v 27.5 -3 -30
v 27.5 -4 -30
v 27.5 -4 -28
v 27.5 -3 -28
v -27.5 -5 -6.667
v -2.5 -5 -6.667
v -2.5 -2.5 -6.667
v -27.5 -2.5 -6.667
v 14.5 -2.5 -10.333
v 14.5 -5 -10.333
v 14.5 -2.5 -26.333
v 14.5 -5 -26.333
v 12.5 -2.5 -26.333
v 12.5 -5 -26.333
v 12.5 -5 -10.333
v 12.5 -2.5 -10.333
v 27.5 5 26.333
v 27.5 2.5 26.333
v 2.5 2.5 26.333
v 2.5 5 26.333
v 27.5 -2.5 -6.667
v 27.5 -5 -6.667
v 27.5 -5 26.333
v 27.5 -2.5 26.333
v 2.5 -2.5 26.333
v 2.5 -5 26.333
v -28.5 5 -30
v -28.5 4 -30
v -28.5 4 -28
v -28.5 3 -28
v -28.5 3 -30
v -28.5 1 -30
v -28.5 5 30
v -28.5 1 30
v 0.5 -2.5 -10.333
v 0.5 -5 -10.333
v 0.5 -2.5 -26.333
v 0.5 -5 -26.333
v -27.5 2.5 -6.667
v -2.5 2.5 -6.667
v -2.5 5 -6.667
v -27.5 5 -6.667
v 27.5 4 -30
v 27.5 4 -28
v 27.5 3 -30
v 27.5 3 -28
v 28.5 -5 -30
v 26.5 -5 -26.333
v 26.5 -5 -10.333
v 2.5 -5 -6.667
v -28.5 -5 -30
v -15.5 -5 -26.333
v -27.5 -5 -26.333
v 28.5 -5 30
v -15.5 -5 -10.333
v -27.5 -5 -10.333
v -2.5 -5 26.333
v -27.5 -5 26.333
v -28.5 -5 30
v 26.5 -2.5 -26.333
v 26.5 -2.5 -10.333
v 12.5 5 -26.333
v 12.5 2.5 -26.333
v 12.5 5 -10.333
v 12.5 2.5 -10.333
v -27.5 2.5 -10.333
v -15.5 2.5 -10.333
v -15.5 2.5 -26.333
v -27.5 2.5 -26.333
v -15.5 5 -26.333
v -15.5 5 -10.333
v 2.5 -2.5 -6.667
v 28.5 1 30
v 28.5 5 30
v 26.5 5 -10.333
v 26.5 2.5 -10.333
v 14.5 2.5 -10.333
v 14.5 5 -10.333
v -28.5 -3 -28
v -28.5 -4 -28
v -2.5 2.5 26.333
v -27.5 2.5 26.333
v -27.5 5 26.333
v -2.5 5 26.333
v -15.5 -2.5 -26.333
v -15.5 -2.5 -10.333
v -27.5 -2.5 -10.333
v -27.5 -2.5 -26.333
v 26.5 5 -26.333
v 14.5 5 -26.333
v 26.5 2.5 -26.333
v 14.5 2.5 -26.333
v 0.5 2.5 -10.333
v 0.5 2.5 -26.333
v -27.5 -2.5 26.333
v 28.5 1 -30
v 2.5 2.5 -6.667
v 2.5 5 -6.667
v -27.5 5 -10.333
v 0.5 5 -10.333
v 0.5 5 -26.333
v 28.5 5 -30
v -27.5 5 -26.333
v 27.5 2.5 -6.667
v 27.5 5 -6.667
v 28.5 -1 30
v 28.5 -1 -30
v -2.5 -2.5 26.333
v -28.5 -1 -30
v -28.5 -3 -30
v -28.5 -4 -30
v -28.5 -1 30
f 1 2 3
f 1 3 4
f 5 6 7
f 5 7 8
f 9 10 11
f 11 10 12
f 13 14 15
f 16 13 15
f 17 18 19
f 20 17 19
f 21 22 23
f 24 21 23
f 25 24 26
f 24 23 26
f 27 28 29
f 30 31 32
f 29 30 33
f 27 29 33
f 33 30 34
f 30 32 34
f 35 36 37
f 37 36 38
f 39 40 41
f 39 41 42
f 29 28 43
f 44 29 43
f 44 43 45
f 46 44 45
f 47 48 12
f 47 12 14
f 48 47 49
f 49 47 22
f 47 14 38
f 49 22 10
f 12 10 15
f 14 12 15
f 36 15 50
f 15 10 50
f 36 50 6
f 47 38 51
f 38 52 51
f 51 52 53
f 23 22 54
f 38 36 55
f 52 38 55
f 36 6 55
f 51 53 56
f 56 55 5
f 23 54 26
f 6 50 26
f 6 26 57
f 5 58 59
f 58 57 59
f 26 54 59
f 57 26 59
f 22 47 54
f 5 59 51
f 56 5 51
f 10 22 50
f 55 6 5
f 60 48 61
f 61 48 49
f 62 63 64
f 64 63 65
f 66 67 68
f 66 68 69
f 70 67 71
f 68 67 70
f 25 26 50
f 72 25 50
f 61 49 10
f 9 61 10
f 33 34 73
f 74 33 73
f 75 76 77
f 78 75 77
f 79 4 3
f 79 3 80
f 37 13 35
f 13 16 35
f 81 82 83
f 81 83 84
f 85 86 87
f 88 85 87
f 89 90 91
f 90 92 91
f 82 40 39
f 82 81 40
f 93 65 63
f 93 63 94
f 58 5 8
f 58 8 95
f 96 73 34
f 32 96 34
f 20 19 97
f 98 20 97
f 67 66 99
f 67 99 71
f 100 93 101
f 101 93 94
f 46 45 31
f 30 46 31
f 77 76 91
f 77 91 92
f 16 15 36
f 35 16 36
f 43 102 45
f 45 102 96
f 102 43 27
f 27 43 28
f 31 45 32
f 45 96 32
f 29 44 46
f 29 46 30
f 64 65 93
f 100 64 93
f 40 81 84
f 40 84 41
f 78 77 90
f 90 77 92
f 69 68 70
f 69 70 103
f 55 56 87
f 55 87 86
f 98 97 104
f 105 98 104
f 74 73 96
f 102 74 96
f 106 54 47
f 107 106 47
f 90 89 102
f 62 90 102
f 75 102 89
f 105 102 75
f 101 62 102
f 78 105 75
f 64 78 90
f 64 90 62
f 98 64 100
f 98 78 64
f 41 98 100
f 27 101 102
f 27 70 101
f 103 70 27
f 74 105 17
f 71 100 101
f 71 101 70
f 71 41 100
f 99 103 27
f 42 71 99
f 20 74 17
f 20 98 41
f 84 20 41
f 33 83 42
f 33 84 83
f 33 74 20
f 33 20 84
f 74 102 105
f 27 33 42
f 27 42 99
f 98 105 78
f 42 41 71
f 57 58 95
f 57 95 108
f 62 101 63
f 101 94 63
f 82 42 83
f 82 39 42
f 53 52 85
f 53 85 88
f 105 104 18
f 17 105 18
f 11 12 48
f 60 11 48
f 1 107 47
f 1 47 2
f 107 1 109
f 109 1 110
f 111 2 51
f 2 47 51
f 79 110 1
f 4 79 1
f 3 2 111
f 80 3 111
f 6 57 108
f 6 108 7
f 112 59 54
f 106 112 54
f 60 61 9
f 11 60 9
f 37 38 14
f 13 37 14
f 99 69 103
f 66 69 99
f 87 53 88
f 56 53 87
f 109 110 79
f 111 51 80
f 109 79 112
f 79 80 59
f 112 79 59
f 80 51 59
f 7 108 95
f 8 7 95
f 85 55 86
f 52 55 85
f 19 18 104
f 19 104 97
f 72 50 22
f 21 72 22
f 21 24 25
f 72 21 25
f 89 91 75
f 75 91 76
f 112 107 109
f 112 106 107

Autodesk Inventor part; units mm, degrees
ref_plane "YZ Plane" through (0, 0, 0) normal (1, 0, 0) x (0, 1, 0)
ref_plane "XZ Plane" through (0, 0, 0) normal (0, 1, 0) x (-1, 0, 0)
ref_plane "XY Plane" through (0, 0, 0) normal (0, 0, 1) x (1, 0, 0)
sketch "Schizzo1" plane through (0, 0, 0) normal (0, 1, 0) x (-1, 0, 0)
  line L0 (28.5, 30) -> (-28.5, 30)
  line L1 (-28.5, 30) -> (-28.5, -30)
  line L2 (-28.5, -30) -> (28.5, -30)
  line L3 (28.5, -30) -> (28.5, 30)
  line L4 (0, 0) -> (0, -115.6454) construction
  line L5 (0, 0) -> (39.5796, 0) construction
  line L6 (27.5, 26.3333) -> (2.5, 26.3333)
  line L7 (2.5, 26.3333) -> (2.5, -6.6667)
  line L8 (2.5, -6.6667) -> (27.5, -6.6667)
  line L9 (27.5, -6.6667) -> (27.5, 26.3333)
  line L10 (28.5, 30) -> (28.5, 26.3333) construction
  line L11 (28.5, 26.3333) -> (27.5, 26.3333) construction
  line L12 (15.5, -10.3333) -> (15.5, -26.3333)
  line L13 (15.5, -26.3333) -> (27.5, -26.3333)
  line L14 (27.5, -26.3333) -> (27.5, -10.3333)
  line L15 (27.5, -10.3333) -> (15.5, -10.3333)
  line L16 (27.5, -6.6667) -> (27.5, -10.3333) construction
  line L17 (27.5, -10.3333) -> (28.5, -10.3333) construction
  line L18 (1.5, -10.3333) -> (1.5, -26.3333)
  line L19 (1.5, -26.3333) -> (13.5, -26.3333)
  line L20 (13.5, -10.3333) -> (1.5, -10.3333)
  line L21 (15.5, -10.3333) -> (13.5, -10.3333) construction
  line L22 (-2.5, -6.6667) -> (-27.5, -6.6667)
  line L23 (-27.5, -6.6667) -> (-27.5, 26.3333)
  line L24 (-27.5, 26.3333) -> (-2.5, 26.3333)
  line L25 (-2.5, 26.3333) -> (-2.5, -6.6667)
  line L26 (-14.5, -10.3333) -> (-14.5, -26.3333)
  line L27 (-14.5, -26.3333) -> (-26.5, -26.3333)
  line L28 (-26.5, -26.3333) -> (-26.5, -10.3333)
  line L29 (-26.5, -10.3333) -> (-14.5, -10.3333)
  line L30 (-0.5, -10.3333) -> (-0.5, -26.3333)
  line L31 (-12.5, -26.3333) -> (-12.5, -10.3333)
  line L32 (-12.5, -10.3333) -> (-0.5, -10.3333)
  line L33 (-0.5, -26.3333) -> (-12.5, -26.3333)
  line L34 (4.1, -0.1) -> (3.9, -0.1) construction
  line L35 (1.5, -10.3333) -> (-0.5, -10.3333) construction
  line L36 (-12.5, -10.3333) -> (-14.5, -10.3333) construction
  line L37 (2.5, 26.3333) -> (-2.5, 26.3333) construction
  line L38 (27.5, 30) -> (27.5, 0)
  line L39 (27.5, 0) -> (2.5, 0)
  line L40 (2.5, 0) -> (2.5, 30)
  line L41 (-27.5, 0) -> (-2.5, 0)
  line L42 (-2.5, 30) -> (-2.5, 0)
  line L43 (-2.5, 0) -> (-27.5, 0)
  line L44 (-27.5, 0) -> (-27.5, 30)
  line L45 (28, 30) -> (28, 26.3333) construction
  line L46 (27.5, -30) -> (27.5, -14)
  line L47 (27.5, -14) -> (15.5, -14)
  line L48 (15.5, -14) -> (15.5, -30)
  line L49 (27.5, -30) -> (27.5, -26.3333) construction
  line L50 (27.5, -26.3333) -> (28.5, -26.3333) construction
  line L51 (28, -26.3333) -> (28, -30) construction
  line L52 (15.5, -26.3333) -> (13.5, -26.3333) construction
  line L53 (-27.5, 26.3333) -> (-28.5, 26.3333) construction
  line L54 (13.5, -26.3333) -> (13.5, -10.3333)
  line L55 (1.5, -14) -> (1.5, -30)
  line L56 (13.5, -14) -> (1.5, -14)
  line L57 (13.5, -30) -> (13.5, -14)
  line L58 (-12.5, -14) -> (-12.5, -30)
  line L59 (-0.5, -14) -> (-12.5, -14)
  line L60 (-0.5, -30) -> (-0.5, -14)
  line L61 (-26.5, -14) -> (-26.5, -30)
  line L62 (-14.5, -14) -> (-26.5, -14)
  line L63 (-14.5, -30) -> (-14.5, -14)
  point P0 (0.4384, -30)
  point P1 (-4.1232, -30)
  dimension "d2" = 25
  dimension "d3" = 33
  dimension "d6" = 12
  dimension "d26" = 60
  dimension "d46" = 30
  dimension "d47" = 16
  dimension "d52" = 11.0796
  dimension "d61" = 57
  dimension "d62" = 2
  dimension "d63" = 16
  dimension "d66" = 14
  dimension "d71" = 5
extrude "Estrusione1" add sketch "Schizzo1" along normal mid plane 10 contours L3 L2 L46 L14 L15 L12 L48 L57 L54 L20 L18 L55 L60 L30 L32 L31 L58 L63 L26 L29 L28 L61 L1 L0 L44 L23 L22 L25 L42 L40 L7 L8 L9 L38 | L38 L6 L40 L0 | L2 L48 L13 L46 | L42 L24 L44 L0 | L2 L55 L19 L57 | L19 L18 L56 L54 | L2 L58 L33 L60 | L56 L18 L20 L54 | L61 L27 L63 L2
extrude "Estrusione2" add sketch "Schizzo1" along normal mid plane 5 contours L9 L39 L7 L6 | L9 L8 L7 L39 | L13 L12 L47 L14 | L25 L41 L23 L24 | L47 L12 L15 L14 | L25 L22 L23 L41 | L33 L31 L59 L30 | L28 L62 L26 L27 | L59 L31 L32 L30 | L28 L29 L26 L62
sketch "Schizzo3" plane through (-28.5, 5, 30) normal (0, 0, 1) x (1, 0, 0)
  line L0 (0, -10) -> (0, 0) construction
  line L1 (0, -5) -> (28.5, -5) construction
  line L2 (1, -10) -> (26, -10) projected
  line L3 (1, 0) -> (1, -2.5) projected
  line L4 (89, -2.5) -> (89, 0) projected
  line L5 (0, -5) -> (0, -9) construction
  line L6 (0, -5) -> (0, -8) construction
  line L7 (0, -8) -> (57, -8)
  line L8 (57, -10) -> (57, 0) projected
  line L9 (0, -9) -> (57, -9)
  line L10 (89, -9) -> (89, -8)
  line L11 (1, -9) -> (1, -8)
  line L12 (0, -2) -> (57, -2)
  line L13 (0, -1) -> (57, -1)
  line L14 (89, -1) -> (89, -2)
  line L15 (1, -1) -> (1, -2)
  point P0 (1, -7.5)
  dimension "d40" = 4
  dimension "d41" = 3
extrude "Estrusione5" [suppressed]
sketch "Schizzo4" plane through (28.5, 5, -30) normal (0, 0, -1) x (-1, 0, 0)
  line L0 (89, -2) -> (89, -1) projected
  line L1 (89, -2) -> (89, -1)
  line L2 (89, -1) -> (1, -1) projected
  line L3 (89, -1) -> (1, -1)
  line L4 (1, -1) -> (1, -2) projected
  line L5 (1, -1) -> (1, -2)
  line L6 (1, -2) -> (89, -2) projected
  line L7 (1, -2) -> (89, -2)
  line L8 (89, -8) -> (1, -8) projected
  line L9 (1, -9) -> (89, -9) projected
  line L10 (89, -8) -> (89, -9)
  line L11 (89, -9) -> (1, -9)
  line L12 (1, -9) -> (1, -8)
  line L13 (1, -8) -> (89, -8)
  point P0 (28.5, -5)
extrude "Estrusione6" cut sketch "Schizzo4" against normal blind 2
extrude "Estrusione7" cut sketch "Schizzo1" along normal mid plane 2
extrude "Estrusione8" cut sketch "Schizzo1" along normal mid plane 1
properties part number "cotieni SD-micro SD versione2"
